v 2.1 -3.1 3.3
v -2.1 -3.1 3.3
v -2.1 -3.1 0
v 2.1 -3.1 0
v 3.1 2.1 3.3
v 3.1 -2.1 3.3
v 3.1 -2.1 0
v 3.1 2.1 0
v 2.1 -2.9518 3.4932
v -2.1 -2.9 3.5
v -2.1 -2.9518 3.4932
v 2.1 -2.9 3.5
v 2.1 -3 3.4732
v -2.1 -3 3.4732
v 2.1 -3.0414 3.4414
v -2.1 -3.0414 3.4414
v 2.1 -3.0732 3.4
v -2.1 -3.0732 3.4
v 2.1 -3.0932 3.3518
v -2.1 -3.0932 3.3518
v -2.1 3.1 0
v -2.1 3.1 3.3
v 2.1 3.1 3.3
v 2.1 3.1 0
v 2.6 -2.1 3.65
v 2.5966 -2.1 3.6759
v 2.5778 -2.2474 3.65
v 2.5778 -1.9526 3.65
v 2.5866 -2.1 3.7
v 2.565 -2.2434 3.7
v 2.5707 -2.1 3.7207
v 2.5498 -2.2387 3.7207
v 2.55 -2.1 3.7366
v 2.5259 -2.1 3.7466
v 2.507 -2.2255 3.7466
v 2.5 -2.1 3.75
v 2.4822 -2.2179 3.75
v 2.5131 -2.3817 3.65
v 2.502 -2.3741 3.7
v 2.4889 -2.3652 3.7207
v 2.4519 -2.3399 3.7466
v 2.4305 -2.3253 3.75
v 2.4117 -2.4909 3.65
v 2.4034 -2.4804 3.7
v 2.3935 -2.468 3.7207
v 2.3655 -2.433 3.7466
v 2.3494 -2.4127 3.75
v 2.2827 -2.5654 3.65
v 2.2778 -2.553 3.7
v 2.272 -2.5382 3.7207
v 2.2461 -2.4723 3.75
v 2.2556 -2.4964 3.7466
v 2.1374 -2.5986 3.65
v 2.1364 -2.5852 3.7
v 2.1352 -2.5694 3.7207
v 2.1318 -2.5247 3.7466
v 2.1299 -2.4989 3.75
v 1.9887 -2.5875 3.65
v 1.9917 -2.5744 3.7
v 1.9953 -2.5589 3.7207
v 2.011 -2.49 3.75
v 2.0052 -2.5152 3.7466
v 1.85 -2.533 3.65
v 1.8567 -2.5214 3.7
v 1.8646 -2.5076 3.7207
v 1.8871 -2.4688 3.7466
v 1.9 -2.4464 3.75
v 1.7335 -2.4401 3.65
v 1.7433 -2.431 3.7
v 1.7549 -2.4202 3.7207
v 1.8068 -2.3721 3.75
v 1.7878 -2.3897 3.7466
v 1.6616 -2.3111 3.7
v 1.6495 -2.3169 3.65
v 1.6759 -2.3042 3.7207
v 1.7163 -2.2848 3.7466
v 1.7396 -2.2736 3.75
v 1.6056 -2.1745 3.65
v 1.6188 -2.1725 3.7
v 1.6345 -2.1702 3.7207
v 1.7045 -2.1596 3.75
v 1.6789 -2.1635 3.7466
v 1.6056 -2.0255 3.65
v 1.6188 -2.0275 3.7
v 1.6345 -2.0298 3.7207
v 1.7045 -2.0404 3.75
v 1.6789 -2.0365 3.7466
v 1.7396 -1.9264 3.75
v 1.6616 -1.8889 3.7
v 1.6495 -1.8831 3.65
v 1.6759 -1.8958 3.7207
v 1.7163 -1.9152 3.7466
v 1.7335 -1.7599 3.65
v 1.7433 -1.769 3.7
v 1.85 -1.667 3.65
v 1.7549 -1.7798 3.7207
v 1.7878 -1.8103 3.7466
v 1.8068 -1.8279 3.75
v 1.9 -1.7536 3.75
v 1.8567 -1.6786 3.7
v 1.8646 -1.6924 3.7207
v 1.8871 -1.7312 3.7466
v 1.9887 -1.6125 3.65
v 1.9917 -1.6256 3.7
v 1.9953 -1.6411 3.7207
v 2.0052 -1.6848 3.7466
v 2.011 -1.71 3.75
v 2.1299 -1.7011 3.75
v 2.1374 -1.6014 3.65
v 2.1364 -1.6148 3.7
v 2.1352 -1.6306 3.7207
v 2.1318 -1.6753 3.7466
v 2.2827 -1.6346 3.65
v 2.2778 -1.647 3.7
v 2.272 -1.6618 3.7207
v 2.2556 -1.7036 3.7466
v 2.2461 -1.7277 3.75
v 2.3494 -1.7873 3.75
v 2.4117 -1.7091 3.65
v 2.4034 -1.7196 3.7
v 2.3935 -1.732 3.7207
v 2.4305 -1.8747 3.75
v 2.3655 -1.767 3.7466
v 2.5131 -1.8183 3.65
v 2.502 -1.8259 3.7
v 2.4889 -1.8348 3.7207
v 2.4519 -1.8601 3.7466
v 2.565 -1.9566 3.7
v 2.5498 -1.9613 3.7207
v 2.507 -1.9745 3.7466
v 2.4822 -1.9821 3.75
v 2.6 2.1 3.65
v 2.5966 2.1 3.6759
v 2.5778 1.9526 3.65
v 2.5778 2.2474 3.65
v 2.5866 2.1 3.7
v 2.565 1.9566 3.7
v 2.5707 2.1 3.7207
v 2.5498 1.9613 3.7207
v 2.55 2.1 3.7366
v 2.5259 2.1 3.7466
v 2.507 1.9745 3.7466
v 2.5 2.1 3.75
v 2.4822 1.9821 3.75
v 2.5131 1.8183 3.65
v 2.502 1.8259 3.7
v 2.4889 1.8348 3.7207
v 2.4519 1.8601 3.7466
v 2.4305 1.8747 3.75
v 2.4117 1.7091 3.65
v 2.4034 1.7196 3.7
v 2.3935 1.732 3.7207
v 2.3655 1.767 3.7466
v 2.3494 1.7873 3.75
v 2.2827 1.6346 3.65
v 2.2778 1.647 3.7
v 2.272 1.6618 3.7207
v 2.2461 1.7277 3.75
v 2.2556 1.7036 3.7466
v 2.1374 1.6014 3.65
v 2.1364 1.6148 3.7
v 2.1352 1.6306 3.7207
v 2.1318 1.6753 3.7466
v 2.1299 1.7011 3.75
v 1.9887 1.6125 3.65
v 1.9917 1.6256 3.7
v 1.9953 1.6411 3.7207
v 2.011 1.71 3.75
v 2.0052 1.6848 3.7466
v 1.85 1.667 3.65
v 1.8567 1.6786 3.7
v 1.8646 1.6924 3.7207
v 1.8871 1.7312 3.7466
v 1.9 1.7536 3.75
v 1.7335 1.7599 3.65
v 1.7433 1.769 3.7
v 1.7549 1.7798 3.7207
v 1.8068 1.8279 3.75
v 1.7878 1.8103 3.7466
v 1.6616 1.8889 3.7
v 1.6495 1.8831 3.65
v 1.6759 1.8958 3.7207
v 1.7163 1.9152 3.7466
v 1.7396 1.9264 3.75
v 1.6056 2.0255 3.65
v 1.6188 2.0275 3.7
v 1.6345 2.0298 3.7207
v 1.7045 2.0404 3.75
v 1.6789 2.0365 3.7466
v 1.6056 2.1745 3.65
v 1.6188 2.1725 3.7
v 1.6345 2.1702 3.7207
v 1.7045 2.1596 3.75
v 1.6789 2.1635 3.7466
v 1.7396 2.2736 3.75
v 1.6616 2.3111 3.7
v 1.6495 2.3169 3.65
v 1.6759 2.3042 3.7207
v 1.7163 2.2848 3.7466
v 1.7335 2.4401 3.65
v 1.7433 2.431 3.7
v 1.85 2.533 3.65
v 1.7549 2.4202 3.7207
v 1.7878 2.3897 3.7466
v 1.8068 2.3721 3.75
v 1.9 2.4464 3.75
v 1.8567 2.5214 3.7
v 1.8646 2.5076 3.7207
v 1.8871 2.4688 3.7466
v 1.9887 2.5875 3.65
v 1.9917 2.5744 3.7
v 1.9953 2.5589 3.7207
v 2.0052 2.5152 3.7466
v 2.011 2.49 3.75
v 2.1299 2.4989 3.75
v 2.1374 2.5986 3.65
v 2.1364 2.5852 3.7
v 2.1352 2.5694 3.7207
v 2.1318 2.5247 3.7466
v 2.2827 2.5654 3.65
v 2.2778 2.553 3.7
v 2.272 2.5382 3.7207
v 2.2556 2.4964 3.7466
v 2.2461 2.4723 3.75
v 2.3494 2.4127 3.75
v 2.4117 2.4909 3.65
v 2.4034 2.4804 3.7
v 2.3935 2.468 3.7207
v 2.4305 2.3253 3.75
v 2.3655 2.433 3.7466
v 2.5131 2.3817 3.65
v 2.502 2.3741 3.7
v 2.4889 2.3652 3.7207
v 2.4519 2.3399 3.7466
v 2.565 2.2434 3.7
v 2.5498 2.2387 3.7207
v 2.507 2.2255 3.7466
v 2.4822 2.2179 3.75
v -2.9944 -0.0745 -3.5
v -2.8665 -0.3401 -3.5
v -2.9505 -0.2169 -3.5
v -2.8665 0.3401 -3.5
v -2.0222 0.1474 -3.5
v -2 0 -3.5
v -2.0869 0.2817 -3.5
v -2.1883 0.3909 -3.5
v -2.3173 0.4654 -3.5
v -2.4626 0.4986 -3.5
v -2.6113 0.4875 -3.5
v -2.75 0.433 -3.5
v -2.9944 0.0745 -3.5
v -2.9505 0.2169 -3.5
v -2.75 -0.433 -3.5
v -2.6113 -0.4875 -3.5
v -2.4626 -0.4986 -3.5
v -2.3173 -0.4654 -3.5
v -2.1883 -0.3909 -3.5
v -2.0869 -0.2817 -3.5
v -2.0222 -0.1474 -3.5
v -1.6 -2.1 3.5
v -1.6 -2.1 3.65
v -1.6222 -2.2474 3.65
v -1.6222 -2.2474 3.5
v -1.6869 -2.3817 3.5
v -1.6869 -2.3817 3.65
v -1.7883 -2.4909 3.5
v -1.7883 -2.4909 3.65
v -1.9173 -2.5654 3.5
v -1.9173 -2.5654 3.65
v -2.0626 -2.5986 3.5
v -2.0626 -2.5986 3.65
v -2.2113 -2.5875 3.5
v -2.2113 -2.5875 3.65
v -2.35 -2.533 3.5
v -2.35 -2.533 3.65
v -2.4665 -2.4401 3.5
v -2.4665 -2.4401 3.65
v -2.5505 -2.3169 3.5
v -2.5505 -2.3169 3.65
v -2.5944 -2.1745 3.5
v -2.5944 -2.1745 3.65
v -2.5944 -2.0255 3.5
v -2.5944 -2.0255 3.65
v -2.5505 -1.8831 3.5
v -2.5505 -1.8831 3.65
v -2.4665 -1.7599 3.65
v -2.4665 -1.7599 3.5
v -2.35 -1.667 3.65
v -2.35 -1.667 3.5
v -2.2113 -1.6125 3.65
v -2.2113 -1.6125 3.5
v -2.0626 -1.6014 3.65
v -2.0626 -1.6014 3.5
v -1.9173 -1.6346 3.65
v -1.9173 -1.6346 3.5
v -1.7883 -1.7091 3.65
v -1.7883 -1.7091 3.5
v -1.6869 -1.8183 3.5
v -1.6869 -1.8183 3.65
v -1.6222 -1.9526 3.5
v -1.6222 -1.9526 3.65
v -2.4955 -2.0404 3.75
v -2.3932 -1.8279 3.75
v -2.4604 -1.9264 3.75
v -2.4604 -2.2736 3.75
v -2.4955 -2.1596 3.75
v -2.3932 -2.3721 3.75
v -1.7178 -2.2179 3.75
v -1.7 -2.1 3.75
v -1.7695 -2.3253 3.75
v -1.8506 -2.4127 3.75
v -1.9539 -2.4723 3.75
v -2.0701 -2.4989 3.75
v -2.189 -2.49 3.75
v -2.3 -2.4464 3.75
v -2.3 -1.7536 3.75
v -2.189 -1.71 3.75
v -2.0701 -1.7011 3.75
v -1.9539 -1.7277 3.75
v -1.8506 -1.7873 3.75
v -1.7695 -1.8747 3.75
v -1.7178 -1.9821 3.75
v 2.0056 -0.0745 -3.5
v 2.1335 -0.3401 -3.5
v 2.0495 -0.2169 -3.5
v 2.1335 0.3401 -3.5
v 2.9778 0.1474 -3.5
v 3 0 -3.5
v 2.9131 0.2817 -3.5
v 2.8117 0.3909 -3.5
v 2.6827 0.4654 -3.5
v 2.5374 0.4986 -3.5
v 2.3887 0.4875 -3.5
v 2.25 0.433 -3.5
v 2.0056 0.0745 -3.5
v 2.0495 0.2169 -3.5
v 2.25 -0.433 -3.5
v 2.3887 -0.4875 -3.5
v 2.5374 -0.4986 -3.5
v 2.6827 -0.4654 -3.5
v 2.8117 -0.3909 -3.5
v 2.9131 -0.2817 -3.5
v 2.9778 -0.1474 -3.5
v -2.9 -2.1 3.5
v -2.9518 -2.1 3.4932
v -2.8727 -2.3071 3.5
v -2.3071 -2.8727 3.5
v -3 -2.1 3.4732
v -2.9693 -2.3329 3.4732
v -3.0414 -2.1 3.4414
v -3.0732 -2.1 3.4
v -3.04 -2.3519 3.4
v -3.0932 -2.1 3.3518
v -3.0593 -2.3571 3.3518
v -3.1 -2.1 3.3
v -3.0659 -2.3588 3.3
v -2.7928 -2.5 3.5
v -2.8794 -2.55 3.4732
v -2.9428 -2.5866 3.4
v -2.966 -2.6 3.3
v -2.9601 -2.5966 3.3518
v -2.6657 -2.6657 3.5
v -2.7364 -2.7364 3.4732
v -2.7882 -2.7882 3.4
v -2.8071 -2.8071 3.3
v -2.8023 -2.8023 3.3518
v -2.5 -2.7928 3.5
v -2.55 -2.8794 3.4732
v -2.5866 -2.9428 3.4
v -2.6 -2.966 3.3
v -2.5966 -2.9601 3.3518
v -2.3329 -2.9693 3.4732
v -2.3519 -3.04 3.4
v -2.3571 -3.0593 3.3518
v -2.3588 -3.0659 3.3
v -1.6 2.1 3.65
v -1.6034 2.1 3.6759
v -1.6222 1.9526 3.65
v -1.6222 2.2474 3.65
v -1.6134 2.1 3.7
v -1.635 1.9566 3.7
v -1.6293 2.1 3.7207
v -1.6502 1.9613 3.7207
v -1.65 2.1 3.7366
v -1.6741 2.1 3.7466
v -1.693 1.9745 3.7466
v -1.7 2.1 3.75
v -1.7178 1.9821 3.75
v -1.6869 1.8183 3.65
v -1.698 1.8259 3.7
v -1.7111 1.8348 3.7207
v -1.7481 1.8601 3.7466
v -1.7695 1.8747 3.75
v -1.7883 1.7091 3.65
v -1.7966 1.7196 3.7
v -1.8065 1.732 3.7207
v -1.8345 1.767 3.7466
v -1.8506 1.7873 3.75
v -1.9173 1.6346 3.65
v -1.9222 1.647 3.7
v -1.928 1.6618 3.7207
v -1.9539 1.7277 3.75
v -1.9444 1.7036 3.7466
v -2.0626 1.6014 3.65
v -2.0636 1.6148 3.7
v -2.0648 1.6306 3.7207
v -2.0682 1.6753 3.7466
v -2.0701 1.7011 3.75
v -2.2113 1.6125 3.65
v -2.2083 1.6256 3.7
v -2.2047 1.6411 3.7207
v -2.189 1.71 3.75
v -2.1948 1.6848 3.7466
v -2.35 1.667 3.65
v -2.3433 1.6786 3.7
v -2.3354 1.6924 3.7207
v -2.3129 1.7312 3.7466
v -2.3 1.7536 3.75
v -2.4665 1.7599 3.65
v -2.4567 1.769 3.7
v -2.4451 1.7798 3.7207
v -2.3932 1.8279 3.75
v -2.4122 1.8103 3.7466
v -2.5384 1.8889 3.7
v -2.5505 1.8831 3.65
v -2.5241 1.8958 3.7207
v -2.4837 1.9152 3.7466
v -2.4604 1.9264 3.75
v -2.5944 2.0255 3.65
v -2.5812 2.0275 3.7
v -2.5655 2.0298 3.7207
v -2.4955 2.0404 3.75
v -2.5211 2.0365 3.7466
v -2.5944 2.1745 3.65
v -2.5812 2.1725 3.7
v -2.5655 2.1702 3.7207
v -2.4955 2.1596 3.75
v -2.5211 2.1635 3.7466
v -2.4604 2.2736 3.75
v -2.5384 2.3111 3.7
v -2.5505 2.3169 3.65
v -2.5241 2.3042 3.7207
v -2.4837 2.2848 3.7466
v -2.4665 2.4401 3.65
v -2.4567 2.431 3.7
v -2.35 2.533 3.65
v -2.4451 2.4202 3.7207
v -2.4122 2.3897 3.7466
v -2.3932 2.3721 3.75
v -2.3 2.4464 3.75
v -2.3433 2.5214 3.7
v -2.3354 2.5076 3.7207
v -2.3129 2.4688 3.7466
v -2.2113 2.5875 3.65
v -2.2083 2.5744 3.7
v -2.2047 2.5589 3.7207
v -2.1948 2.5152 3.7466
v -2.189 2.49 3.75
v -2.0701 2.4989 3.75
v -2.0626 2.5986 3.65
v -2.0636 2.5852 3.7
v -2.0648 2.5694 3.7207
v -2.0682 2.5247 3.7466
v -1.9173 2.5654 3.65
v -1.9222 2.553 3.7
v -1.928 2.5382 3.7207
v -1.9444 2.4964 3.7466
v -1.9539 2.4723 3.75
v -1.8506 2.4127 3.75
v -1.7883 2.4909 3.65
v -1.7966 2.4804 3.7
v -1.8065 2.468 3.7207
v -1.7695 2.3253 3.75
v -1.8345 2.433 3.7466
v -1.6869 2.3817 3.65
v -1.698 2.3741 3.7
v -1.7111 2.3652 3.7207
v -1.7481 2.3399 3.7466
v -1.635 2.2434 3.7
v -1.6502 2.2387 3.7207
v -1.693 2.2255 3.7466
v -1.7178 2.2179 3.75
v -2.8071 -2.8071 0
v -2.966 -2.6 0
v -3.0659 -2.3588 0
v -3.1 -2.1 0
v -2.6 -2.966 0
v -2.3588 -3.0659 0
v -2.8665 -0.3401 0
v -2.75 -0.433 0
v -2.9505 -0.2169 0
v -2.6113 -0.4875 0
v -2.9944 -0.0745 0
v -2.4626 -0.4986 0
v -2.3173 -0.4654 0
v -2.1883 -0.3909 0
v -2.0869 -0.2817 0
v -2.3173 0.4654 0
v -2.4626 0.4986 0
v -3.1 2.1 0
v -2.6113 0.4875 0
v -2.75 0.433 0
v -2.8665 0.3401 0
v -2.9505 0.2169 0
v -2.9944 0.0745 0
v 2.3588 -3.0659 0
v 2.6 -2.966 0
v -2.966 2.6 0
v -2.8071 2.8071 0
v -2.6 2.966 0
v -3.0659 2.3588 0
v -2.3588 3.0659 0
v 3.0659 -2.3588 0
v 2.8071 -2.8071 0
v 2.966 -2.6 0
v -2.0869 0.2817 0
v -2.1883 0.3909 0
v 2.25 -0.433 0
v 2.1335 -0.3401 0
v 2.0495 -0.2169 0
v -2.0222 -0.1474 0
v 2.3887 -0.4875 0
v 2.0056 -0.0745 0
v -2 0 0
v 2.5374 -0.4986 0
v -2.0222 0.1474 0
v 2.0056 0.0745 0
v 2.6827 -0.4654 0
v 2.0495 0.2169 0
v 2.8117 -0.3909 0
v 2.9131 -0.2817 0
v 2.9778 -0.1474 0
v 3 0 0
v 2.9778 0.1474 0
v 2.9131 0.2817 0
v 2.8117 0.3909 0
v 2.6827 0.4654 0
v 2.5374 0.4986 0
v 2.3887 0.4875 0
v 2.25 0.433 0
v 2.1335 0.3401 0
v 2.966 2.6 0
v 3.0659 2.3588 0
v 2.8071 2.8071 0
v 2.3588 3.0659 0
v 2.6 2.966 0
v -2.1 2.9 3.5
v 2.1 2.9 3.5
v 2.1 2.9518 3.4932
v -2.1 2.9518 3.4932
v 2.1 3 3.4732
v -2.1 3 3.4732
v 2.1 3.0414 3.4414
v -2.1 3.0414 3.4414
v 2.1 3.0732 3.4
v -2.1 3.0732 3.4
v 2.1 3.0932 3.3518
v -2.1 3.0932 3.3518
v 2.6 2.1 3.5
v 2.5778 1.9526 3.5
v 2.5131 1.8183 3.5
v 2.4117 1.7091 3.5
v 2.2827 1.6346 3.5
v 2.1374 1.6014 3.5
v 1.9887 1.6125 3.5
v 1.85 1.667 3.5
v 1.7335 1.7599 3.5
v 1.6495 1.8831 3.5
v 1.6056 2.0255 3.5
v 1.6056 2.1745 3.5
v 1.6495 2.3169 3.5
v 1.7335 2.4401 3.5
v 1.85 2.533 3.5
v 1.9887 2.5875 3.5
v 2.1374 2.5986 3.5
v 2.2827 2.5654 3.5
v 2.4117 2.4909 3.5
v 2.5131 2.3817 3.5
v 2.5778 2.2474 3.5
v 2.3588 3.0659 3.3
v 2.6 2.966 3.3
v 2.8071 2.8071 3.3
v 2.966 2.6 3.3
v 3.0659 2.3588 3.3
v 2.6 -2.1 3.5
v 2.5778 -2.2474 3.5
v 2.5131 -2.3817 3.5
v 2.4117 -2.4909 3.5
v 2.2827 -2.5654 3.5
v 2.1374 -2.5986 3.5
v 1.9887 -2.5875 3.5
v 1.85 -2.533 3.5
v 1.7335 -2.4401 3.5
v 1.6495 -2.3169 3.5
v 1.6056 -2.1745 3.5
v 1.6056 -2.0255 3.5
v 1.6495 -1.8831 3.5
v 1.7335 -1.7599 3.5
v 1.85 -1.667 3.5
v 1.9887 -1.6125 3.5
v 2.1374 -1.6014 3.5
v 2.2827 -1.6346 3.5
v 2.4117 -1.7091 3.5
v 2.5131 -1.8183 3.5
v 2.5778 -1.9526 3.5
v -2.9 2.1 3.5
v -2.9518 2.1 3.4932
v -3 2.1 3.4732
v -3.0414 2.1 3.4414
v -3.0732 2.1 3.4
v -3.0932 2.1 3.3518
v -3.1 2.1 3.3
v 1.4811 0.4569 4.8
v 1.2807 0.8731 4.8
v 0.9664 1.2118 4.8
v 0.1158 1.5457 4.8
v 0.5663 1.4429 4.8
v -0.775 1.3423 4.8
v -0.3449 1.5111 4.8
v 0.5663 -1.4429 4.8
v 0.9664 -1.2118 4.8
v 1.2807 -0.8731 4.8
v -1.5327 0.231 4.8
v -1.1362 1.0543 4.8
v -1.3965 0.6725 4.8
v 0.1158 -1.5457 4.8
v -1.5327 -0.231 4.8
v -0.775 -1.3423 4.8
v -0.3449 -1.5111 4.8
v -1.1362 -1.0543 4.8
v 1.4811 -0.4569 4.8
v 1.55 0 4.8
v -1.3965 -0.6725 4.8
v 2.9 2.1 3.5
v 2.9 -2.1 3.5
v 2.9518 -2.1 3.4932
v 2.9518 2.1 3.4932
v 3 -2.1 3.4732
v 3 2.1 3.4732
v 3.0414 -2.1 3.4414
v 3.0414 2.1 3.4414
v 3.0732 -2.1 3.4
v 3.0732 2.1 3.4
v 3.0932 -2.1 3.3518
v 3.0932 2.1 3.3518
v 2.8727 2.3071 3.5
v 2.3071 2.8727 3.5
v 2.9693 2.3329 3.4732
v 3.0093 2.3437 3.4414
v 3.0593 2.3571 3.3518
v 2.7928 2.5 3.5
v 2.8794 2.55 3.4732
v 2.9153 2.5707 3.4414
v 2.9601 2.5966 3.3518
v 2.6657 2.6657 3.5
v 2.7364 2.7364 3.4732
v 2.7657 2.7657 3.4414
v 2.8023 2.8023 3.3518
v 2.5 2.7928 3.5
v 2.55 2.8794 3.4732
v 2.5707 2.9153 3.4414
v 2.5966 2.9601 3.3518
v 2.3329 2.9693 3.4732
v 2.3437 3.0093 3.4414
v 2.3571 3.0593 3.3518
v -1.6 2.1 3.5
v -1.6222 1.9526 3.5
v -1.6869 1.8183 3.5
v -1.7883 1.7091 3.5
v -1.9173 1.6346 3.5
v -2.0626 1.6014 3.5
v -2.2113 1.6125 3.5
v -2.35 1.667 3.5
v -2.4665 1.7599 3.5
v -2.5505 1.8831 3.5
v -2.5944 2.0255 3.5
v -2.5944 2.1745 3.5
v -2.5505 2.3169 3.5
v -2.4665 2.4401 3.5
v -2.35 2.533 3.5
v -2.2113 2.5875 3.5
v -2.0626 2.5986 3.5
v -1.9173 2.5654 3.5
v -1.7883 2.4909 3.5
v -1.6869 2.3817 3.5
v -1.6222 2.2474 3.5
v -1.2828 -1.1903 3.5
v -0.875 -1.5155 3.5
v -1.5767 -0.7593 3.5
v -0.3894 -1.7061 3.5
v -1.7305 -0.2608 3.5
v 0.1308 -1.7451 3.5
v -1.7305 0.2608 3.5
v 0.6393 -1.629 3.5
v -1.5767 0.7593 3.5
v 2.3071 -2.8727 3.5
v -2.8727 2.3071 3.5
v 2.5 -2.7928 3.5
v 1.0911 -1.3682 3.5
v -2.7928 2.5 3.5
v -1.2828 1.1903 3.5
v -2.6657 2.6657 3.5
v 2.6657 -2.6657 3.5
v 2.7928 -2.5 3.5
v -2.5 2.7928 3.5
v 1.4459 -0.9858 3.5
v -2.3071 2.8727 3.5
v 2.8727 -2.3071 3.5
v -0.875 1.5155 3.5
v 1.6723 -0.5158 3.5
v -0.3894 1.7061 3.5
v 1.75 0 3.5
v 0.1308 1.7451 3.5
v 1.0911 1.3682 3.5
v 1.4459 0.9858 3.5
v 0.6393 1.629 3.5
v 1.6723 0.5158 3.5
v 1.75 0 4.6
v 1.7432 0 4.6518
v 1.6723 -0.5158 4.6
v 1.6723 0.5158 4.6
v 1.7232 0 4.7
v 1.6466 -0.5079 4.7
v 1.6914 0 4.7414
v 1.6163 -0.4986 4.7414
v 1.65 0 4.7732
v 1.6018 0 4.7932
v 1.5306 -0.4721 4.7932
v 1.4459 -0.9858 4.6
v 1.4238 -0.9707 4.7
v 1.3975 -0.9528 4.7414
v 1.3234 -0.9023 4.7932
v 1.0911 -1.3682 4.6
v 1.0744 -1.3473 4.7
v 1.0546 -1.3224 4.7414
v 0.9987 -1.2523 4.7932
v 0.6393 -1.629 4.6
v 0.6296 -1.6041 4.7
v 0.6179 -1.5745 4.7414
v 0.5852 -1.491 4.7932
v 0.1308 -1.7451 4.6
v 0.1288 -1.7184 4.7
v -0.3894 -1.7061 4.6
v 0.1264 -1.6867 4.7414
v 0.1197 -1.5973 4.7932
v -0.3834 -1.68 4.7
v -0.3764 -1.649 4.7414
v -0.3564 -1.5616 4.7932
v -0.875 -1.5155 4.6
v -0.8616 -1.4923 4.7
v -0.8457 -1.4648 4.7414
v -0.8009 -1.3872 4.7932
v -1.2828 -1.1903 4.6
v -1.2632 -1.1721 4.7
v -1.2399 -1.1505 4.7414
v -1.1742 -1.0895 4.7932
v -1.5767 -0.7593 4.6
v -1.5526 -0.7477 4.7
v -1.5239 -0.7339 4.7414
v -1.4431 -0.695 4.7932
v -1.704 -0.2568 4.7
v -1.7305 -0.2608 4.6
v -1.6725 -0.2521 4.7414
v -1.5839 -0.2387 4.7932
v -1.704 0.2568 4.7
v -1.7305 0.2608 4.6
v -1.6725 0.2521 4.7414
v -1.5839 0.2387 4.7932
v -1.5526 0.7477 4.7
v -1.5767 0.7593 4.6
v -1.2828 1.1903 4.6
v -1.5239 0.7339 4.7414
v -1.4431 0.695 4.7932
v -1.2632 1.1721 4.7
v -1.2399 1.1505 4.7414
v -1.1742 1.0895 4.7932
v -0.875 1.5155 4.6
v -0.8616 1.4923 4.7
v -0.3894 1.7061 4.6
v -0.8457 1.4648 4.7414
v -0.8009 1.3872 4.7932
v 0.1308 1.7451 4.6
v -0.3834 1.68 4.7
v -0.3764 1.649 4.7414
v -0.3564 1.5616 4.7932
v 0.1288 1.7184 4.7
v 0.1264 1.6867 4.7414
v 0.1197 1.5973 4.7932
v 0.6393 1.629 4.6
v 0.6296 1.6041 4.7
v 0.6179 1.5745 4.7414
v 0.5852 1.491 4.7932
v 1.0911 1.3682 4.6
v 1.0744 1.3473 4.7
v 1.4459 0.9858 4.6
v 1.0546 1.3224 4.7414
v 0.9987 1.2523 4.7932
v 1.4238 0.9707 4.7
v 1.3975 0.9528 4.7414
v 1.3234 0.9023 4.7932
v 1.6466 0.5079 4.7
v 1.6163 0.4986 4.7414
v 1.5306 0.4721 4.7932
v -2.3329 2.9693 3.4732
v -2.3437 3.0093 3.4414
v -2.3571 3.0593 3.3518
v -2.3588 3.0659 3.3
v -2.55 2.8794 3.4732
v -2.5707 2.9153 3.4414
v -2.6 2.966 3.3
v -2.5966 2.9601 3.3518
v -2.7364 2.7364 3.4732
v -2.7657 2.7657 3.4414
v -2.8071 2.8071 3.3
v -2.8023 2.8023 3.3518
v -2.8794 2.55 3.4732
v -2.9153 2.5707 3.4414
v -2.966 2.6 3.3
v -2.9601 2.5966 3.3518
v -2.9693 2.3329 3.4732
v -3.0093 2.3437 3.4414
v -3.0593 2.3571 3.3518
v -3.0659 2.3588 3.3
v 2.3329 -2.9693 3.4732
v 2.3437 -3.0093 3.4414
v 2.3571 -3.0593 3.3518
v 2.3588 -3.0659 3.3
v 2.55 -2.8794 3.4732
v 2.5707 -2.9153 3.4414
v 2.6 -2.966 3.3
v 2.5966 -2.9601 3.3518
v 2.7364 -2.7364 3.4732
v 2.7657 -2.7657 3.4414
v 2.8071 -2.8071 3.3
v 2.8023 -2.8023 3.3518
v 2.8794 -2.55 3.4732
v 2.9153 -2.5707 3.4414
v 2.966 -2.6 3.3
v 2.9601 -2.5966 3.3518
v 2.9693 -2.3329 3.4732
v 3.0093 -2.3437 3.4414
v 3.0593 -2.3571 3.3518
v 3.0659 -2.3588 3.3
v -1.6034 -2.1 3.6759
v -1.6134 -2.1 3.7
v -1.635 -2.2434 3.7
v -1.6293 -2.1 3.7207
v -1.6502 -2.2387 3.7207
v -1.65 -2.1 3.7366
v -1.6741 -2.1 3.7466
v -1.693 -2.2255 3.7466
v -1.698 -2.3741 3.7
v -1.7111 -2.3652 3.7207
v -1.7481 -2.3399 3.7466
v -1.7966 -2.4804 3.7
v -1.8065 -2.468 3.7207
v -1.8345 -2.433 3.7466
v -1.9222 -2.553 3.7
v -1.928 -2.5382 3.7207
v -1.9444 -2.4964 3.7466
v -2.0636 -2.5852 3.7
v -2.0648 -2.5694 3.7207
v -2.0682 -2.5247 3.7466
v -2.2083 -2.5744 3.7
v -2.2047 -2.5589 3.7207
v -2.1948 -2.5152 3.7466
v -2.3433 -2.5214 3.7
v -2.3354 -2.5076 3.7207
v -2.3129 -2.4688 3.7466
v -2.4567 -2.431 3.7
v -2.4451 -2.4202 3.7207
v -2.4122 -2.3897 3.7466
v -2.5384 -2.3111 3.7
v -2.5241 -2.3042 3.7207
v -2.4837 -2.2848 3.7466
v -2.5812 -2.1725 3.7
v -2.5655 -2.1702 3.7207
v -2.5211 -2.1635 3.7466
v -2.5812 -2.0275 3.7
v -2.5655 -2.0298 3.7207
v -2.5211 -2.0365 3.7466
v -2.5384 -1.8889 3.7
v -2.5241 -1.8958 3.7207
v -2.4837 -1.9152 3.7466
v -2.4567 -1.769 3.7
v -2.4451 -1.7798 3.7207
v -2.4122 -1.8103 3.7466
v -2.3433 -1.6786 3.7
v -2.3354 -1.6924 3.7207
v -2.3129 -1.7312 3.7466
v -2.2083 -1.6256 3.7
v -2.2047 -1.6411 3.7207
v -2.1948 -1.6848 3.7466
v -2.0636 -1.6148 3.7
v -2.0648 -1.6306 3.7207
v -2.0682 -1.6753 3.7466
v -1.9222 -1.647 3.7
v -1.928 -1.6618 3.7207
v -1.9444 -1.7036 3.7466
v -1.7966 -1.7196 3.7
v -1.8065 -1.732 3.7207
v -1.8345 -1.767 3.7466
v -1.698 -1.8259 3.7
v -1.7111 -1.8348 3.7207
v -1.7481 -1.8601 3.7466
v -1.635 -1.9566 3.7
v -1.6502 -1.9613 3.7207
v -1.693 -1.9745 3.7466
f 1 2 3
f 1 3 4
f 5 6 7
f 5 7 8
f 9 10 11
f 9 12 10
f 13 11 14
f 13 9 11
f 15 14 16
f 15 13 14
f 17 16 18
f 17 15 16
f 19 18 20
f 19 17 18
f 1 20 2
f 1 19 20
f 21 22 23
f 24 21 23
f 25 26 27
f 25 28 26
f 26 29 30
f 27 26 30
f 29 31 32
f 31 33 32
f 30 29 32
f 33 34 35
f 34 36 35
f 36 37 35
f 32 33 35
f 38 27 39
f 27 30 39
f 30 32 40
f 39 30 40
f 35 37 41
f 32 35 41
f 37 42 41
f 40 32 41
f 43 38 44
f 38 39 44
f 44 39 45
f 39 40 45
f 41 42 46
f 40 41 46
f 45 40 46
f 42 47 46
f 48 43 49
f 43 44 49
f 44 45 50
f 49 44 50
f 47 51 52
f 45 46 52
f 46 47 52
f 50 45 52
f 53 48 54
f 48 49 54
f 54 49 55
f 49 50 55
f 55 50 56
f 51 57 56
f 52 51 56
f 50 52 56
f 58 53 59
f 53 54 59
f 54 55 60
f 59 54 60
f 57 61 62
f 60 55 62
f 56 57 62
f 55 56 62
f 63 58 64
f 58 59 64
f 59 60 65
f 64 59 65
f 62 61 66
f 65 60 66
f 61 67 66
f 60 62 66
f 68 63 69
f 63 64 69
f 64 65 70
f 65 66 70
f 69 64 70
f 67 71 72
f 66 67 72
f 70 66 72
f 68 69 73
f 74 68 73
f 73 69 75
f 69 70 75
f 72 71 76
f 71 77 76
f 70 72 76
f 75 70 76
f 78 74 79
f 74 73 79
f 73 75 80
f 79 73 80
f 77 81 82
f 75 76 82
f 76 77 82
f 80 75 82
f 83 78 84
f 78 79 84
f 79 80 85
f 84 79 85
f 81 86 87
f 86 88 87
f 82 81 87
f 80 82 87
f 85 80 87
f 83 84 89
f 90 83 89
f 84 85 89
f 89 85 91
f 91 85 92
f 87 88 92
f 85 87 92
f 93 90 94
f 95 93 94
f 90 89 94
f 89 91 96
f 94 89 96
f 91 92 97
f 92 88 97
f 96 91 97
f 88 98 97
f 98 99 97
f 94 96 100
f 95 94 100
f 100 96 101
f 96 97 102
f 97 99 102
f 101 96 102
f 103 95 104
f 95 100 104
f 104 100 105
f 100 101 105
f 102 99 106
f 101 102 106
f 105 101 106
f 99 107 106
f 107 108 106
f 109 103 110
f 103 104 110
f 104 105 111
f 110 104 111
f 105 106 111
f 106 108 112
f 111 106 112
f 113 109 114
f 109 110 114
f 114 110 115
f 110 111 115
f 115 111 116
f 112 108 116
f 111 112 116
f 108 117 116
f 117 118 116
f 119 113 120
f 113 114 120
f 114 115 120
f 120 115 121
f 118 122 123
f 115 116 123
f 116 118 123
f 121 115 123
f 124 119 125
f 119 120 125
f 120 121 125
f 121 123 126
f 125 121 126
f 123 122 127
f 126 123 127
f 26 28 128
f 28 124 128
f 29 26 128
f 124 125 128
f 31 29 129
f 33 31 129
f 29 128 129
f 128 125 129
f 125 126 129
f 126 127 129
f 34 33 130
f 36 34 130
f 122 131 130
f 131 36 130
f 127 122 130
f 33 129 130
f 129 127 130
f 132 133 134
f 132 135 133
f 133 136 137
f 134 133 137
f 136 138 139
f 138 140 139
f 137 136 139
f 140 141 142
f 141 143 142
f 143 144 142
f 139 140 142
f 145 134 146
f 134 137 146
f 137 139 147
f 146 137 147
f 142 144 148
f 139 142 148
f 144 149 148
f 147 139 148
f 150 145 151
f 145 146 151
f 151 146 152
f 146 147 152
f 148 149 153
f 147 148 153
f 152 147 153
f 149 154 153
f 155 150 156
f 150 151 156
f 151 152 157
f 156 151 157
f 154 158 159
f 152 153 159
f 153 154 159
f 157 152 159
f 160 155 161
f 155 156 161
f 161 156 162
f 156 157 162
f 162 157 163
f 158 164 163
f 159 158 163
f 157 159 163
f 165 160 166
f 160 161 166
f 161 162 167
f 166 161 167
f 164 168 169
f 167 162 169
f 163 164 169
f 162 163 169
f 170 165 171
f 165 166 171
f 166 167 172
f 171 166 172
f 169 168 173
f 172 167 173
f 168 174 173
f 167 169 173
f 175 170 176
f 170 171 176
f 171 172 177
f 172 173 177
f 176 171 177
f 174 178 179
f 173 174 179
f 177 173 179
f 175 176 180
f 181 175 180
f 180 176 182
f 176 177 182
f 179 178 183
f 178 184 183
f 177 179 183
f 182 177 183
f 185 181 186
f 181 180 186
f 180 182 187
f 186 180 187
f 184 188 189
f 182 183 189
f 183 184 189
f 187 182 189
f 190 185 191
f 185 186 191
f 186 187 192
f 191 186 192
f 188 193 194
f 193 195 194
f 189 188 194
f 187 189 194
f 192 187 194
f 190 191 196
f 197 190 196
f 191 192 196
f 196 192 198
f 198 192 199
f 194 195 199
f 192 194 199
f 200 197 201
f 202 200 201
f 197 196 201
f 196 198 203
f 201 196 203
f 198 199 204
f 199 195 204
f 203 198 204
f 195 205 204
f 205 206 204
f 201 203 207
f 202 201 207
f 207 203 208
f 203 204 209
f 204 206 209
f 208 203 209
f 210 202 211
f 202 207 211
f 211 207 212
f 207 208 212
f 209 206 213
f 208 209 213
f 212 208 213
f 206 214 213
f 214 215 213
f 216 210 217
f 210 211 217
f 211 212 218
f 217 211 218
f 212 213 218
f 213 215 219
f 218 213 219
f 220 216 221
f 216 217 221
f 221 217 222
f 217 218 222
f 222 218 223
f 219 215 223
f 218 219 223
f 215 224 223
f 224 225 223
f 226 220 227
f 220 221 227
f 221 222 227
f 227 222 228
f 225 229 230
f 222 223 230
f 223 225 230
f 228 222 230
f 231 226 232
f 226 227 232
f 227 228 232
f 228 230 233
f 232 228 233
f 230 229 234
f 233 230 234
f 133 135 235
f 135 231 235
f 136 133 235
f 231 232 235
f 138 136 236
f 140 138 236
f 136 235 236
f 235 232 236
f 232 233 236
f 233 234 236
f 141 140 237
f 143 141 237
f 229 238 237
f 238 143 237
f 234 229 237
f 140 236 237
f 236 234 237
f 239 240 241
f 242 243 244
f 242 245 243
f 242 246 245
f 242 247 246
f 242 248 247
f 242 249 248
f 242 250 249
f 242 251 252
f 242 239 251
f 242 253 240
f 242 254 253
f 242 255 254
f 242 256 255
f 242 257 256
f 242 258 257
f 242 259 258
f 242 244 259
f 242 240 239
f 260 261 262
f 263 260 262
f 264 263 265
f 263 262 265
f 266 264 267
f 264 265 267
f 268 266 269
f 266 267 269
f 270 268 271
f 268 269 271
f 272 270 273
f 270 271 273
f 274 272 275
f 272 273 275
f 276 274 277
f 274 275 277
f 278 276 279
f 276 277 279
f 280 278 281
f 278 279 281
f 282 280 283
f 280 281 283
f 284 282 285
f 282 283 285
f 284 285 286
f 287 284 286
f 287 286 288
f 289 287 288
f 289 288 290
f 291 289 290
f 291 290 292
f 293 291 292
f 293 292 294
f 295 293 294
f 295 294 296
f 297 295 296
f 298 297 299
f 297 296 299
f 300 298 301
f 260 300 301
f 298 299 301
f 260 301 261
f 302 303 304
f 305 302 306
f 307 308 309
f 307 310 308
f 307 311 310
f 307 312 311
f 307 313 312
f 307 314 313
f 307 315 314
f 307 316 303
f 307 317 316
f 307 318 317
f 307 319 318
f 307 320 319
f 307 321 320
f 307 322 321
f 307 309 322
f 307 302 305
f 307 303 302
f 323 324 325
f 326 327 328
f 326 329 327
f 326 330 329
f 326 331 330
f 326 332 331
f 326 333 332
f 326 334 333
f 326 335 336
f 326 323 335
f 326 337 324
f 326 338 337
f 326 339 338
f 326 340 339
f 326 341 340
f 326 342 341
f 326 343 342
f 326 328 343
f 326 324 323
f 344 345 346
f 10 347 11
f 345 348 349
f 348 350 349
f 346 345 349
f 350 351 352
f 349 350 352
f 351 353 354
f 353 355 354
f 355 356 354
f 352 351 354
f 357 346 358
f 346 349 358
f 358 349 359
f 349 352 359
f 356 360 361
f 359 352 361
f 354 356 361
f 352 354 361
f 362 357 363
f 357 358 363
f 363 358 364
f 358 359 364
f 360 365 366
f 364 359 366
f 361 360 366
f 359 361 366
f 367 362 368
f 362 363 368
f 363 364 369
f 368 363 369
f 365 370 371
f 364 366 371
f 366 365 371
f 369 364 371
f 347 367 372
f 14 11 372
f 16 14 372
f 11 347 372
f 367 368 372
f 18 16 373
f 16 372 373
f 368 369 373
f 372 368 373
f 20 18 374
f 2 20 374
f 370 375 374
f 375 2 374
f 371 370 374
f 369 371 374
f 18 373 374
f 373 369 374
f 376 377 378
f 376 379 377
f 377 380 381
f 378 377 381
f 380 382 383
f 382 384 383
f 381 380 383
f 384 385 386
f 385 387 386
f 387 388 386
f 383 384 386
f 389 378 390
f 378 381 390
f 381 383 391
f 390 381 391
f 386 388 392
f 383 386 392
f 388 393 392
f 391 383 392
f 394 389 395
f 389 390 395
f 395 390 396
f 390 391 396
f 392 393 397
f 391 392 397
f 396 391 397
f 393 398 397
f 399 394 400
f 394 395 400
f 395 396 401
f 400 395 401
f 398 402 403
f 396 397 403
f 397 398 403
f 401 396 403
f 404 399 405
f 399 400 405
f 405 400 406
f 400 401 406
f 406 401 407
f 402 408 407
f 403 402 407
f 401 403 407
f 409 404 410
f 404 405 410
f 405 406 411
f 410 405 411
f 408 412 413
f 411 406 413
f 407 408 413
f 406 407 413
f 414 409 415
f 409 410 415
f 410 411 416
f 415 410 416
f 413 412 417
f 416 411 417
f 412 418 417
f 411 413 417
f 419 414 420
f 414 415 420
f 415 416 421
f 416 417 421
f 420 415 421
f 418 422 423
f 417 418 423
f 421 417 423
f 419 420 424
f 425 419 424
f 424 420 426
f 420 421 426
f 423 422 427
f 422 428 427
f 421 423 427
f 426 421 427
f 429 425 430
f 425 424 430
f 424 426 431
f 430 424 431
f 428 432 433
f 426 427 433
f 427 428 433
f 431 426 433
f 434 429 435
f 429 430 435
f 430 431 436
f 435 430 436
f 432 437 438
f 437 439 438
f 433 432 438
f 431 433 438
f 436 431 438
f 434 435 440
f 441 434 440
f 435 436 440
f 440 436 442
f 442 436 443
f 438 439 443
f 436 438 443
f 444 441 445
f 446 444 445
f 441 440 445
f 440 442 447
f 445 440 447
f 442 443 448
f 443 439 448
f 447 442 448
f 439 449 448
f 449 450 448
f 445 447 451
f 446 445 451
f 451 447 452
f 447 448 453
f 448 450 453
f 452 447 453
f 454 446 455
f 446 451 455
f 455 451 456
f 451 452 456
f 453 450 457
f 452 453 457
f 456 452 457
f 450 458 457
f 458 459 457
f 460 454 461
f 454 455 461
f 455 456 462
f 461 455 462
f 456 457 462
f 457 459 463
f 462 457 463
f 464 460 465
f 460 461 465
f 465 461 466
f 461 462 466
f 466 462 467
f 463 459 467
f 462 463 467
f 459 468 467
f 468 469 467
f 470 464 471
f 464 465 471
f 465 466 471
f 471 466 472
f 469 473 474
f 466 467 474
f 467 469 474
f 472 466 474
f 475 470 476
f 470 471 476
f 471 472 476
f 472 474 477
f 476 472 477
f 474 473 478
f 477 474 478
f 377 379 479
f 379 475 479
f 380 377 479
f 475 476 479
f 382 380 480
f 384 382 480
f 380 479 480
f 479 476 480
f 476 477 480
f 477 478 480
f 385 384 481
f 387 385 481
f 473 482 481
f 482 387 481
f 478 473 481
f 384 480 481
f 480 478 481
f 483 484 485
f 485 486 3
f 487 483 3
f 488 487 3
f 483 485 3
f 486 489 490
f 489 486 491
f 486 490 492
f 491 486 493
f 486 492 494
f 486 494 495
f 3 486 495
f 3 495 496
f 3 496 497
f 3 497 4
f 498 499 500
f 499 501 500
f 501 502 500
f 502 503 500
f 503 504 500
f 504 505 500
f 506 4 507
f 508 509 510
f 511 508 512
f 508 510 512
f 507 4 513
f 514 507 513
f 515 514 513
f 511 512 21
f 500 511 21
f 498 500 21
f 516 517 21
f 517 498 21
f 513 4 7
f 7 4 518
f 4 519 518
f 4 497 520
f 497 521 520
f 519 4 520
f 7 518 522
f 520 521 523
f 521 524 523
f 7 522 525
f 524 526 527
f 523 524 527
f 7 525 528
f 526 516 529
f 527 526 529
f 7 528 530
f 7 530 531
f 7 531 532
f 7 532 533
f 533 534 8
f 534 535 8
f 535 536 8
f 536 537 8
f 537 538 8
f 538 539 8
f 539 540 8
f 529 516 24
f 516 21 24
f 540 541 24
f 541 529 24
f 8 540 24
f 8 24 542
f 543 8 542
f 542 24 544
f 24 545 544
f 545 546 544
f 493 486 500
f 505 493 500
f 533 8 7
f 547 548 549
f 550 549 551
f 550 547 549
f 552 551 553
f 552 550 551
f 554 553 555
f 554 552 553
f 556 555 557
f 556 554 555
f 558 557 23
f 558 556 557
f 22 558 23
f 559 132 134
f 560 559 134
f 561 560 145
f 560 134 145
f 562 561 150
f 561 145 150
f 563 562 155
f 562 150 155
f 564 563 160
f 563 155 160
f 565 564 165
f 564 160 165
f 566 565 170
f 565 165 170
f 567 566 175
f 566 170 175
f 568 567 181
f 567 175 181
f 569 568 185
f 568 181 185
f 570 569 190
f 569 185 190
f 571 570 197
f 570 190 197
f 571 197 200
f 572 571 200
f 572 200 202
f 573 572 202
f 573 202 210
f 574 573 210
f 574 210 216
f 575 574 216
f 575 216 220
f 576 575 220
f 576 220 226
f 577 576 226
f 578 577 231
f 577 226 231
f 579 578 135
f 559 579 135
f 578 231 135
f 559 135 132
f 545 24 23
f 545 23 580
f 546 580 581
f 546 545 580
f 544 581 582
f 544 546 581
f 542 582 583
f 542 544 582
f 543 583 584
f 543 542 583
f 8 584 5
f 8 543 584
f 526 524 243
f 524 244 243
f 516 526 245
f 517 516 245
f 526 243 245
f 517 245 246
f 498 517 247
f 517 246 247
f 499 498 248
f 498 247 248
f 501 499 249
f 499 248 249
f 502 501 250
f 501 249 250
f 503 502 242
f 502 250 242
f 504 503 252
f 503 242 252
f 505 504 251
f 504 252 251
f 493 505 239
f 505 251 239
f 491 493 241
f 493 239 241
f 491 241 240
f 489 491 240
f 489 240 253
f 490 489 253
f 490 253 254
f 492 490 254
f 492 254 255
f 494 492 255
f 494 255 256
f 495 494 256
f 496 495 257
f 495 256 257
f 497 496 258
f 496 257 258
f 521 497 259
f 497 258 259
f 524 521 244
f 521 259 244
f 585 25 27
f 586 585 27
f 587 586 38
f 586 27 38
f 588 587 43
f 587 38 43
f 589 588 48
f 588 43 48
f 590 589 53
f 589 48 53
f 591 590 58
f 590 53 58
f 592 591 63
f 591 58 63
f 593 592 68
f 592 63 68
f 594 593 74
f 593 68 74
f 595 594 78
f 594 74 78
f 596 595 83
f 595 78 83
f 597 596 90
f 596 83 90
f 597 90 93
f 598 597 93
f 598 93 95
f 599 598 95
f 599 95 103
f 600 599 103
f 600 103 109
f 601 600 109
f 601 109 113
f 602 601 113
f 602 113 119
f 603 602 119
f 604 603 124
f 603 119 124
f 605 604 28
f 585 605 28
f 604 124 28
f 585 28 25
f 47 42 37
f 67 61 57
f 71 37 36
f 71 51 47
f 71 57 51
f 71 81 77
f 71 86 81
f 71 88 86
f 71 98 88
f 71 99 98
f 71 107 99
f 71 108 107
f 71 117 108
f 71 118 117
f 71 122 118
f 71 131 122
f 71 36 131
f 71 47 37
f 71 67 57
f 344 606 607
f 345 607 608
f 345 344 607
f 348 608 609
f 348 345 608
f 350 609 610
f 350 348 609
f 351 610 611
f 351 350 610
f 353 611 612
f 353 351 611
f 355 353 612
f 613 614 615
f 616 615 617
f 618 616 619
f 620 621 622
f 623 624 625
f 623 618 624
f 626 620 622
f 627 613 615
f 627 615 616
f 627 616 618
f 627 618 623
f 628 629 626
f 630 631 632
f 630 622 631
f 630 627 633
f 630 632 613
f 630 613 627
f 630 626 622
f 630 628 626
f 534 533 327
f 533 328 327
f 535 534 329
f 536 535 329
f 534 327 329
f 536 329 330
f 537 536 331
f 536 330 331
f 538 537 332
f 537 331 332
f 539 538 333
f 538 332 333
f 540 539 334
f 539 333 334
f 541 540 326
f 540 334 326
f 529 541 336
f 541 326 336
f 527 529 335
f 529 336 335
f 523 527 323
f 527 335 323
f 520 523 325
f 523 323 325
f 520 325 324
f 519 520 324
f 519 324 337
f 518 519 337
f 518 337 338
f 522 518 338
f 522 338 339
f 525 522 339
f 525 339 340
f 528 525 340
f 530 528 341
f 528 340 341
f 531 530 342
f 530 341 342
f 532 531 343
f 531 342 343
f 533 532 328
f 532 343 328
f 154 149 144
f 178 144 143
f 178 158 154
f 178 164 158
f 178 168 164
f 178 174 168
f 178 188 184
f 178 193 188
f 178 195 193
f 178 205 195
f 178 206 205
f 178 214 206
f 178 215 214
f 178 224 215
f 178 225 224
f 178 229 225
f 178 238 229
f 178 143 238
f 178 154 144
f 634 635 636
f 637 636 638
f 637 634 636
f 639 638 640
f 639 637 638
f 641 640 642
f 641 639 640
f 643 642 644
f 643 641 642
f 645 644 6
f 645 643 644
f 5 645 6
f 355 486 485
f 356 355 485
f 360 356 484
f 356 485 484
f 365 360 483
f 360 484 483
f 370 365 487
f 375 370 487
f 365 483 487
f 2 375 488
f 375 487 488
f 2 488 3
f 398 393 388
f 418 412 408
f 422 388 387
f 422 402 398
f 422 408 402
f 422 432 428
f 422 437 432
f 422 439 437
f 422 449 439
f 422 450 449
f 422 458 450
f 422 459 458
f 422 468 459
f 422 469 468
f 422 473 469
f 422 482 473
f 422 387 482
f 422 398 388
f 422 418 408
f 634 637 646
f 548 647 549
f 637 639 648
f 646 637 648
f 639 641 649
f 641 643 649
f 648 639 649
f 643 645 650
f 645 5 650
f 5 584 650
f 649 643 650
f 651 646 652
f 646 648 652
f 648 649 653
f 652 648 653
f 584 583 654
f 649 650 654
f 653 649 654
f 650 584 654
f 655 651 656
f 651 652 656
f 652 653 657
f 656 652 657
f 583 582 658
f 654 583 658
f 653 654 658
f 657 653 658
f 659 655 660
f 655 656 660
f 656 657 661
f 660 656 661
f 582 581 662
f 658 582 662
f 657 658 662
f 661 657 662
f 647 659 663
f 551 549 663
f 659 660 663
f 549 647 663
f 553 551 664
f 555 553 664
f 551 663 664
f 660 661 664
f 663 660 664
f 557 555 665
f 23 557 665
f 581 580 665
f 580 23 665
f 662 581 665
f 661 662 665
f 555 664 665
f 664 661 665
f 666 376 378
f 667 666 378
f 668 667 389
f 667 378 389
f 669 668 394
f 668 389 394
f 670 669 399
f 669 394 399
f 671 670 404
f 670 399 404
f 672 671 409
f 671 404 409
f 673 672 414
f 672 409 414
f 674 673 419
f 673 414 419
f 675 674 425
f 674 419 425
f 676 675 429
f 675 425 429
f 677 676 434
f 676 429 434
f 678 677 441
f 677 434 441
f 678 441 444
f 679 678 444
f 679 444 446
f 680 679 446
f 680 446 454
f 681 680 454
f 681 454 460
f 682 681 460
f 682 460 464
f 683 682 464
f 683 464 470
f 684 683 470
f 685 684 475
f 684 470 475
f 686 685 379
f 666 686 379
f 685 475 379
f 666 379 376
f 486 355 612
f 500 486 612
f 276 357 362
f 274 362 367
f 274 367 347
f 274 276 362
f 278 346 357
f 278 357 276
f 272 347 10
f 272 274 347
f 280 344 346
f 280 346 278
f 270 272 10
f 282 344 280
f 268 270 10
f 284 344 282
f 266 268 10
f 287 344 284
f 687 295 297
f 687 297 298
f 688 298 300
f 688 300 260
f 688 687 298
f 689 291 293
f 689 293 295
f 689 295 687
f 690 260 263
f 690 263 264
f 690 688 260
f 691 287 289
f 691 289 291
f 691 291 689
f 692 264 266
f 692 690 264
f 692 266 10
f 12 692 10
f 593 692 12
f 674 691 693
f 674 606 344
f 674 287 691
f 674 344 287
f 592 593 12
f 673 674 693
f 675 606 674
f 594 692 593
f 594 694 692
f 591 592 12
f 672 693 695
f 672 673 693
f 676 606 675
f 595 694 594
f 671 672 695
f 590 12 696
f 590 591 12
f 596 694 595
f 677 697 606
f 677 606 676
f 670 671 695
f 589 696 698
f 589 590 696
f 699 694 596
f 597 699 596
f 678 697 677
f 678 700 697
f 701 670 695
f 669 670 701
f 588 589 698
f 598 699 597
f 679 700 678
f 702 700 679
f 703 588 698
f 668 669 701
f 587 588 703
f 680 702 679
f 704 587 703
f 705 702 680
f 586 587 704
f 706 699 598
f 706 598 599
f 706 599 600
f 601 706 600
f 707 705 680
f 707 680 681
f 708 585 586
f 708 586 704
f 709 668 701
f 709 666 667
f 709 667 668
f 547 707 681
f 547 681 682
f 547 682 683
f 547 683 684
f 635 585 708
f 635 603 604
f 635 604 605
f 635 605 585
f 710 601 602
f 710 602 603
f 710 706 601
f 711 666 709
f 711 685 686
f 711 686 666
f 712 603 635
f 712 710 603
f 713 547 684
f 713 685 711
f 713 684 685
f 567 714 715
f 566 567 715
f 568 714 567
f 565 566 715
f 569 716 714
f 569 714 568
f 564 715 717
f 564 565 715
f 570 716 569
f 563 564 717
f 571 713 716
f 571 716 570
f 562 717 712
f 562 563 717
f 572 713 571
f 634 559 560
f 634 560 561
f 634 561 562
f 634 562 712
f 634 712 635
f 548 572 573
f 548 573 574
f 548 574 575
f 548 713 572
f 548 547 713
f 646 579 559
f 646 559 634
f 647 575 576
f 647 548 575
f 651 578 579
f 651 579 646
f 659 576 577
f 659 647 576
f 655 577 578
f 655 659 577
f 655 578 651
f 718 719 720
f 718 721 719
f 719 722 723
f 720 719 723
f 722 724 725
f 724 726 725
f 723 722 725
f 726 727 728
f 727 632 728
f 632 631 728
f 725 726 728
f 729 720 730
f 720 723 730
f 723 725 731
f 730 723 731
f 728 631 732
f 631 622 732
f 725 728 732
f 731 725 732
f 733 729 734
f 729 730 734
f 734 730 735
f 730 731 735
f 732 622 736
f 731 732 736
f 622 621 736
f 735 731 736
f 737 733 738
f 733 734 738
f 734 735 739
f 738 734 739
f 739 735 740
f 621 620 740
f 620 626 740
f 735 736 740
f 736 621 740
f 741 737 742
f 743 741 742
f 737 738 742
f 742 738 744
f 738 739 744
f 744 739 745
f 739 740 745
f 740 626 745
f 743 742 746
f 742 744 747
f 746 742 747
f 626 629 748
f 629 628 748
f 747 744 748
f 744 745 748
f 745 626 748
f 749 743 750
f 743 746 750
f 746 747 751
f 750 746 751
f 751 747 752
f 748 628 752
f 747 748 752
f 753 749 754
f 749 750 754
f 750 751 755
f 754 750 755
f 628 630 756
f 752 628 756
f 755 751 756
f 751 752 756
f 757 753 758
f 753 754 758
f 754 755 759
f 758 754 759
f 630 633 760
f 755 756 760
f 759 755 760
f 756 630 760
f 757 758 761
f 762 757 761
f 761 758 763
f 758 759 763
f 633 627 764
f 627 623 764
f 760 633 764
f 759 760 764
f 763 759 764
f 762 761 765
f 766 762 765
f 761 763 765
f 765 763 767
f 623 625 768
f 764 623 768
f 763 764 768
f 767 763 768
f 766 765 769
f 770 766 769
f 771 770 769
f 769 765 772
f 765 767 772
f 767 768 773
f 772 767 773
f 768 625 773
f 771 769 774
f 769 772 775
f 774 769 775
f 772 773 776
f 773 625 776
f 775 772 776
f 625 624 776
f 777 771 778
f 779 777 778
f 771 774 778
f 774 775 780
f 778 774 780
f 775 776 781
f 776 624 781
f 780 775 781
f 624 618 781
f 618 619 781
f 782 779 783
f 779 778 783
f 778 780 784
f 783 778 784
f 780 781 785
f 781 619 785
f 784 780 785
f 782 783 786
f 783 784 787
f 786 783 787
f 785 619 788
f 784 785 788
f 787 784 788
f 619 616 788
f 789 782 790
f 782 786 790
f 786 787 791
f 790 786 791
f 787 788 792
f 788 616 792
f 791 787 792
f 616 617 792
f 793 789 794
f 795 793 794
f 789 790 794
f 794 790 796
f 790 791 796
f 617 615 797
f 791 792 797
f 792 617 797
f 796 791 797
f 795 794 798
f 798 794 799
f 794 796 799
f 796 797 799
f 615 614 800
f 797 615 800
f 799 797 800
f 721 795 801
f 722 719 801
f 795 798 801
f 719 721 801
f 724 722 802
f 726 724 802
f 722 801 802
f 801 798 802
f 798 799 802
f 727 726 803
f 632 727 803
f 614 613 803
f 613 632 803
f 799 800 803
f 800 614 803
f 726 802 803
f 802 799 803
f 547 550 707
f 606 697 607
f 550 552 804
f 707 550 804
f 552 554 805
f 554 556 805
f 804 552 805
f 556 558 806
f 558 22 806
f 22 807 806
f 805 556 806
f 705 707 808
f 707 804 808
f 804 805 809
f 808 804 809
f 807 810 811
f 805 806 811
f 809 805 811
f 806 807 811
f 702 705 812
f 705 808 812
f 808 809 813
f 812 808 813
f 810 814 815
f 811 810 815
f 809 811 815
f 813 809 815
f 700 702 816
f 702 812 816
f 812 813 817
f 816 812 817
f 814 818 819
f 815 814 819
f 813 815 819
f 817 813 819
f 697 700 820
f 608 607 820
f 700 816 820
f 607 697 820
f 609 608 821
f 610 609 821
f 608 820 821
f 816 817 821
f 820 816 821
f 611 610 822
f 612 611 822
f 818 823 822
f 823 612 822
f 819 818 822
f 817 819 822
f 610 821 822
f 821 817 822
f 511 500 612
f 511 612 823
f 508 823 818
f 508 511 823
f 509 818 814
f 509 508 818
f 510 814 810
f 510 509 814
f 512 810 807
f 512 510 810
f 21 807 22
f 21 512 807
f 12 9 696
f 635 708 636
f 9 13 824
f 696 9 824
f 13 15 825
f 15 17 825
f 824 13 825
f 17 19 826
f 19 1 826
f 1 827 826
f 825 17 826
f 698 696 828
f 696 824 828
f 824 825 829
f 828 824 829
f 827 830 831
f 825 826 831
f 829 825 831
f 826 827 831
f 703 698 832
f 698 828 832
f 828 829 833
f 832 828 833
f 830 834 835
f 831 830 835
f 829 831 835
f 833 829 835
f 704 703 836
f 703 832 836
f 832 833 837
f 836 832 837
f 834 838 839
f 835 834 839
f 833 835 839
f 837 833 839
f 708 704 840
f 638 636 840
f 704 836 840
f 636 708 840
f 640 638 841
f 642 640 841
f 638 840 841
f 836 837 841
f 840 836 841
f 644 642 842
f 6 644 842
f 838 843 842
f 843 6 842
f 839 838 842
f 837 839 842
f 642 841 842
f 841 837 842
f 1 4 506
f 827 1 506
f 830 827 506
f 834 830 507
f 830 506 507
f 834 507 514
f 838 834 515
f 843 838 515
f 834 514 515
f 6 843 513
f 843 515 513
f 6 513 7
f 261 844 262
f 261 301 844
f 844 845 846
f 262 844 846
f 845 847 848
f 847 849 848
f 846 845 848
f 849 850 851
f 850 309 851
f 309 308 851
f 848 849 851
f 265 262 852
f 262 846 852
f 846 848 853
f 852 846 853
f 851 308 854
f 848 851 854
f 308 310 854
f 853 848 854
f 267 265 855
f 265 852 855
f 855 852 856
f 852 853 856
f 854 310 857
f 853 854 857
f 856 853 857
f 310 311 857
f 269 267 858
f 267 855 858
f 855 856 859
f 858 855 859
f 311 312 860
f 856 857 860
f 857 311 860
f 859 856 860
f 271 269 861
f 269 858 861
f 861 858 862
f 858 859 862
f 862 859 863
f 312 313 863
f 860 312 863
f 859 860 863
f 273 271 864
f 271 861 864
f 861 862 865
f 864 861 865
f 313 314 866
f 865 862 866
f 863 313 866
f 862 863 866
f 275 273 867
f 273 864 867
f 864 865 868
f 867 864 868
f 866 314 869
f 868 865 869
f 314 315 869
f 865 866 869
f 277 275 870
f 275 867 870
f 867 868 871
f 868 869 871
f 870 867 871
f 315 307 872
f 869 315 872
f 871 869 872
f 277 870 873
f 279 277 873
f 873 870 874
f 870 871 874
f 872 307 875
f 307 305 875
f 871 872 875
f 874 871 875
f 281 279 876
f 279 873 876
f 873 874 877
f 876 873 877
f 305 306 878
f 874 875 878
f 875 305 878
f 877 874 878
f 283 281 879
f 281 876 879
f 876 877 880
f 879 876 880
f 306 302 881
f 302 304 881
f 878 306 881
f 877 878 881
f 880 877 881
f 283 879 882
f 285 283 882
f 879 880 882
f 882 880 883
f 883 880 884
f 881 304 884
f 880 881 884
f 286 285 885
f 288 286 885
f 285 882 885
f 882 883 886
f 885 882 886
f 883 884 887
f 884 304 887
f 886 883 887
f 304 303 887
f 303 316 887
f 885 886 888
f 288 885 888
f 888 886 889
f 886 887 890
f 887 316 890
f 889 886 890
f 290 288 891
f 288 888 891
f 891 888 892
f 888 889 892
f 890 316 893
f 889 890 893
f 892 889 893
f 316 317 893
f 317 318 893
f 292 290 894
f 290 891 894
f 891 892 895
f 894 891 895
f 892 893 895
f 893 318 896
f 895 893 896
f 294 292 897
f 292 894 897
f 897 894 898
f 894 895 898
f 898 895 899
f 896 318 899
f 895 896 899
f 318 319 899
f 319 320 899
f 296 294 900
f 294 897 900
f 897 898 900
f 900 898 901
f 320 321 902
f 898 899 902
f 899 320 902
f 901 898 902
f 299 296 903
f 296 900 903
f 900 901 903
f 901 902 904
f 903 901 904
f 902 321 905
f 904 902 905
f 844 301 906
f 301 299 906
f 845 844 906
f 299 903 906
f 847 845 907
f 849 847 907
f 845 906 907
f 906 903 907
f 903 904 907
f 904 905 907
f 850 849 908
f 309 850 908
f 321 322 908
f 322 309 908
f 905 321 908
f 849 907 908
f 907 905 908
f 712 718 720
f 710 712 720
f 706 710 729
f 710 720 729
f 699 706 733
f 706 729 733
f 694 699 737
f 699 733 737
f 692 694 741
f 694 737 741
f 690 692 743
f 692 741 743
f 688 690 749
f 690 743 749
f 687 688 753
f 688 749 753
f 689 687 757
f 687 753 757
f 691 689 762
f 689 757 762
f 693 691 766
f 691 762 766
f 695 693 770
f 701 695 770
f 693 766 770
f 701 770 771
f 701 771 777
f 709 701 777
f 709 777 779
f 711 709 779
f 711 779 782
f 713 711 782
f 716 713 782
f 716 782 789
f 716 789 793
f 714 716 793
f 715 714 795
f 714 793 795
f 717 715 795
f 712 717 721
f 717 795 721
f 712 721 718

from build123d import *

# Parameters (mm, degrees)
SKETCH1_W           = 6.2
SKETCH1_H           = 6.2
BOSS_EXTRUDE1_DEPTH = 3.5
SKETCH2_W           = 0.5
SKETCH2_H           = 3.5
SKETCH3_W           = 0.5
SKETCH3_H           = 3.5
SKETCH4_W           = 0.5
SKETCH4_H           = 0.25
SKETCH5_W           = 0.5
SKETCH5_H           = 0.25
SKETCH6_W           = 0.5
SKETCH6_H           = 0.25
SKETCH7_W           = 1.75
SKETCH7_H           = 1.3
SKETCH8_W           = 0.5
SKETCH8_H           = 0.25
FILLET1_R           = 1
FILLET2_R           = 0.1
FILLET3_R           = 0.2


with BuildPart() as part:
    # Sketch1 → Boss-Extrude1 (new body)
    with BuildSketch(Plane.XY.offset(3.5)):
        Rectangle(SKETCH1_W, SKETCH1_H)
    extrude(amount=-BOSS_EXTRUDE1_DEPTH)

    # Sketch2 → Revolve1 (revolve)
    with BuildSketch(Plane(origin=(0, 0, 0), x_dir=(1, 0, 0), z_dir=(0, 1, 0))):
        with Locations((2.75, 1.75)):
            Rectangle(SKETCH2_W, SKETCH2_H)
    revolve(axis=Axis((2.5, 0, -3.5), (0, 0, 1)))

    # Sketch3 → Revolve2 (revolve)
    with BuildSketch(Plane(origin=(0, 0, 0), x_dir=(1, 0, 0), z_dir=(0, 1, 0))):
        with Locations((-2.25, 1.75)):
            Rectangle(SKETCH3_W, SKETCH3_H)
    revolve(axis=Axis((-2.5, 0, -3.5), (0, 0, 1)))

    # Sketch4 → Revolve3 (revolve)
    with BuildSketch(Plane.XZ.offset(2.1)):
        with Locations((2.35, 3.625)):
            Rectangle(SKETCH4_W, SKETCH4_H)
    revolve(axis=Axis((2.1, -2.1, 3.75), (0, 0, -1)))

    # Sketch5 → Revolve4 (revolve)
    with BuildSketch(Plane.XZ.offset(-2.1)):
        with Locations((2.35, 3.625)):
            Rectangle(SKETCH5_W, SKETCH5_H)
    revolve(axis=Axis((2.1, 2.1, 3.75), (0, 0, -1)))

    # Sketch6 → Revolve5 (revolve)
    with BuildSketch(Plane.XZ.offset(-2.1)):
        with Locations((-1.85, 3.625)):
            Rectangle(SKETCH6_W, SKETCH6_H)
    revolve(axis=Axis((-2.1, 2.1, 3.75), (0, 0, -1)))

    # Sketch7 → Revolve6 (revolve)
    with BuildSketch(Plane.XZ):
        with Locations((0.875, 4.15)):
            Rectangle(SKETCH7_W, SKETCH7_H)
    revolve(axis=Axis((0, 0, 4.8), (0, 0, -1)))

    # Sketch8 → Revolve7 (revolve)
    with BuildSketch(Plane.XZ.offset(2.1)):
        with Locations((-1.85, 3.625)):
            Rectangle(SKETCH8_W, SKETCH8_H)
    revolve(axis=Axis((-2.1, -2.1, 3.75), (0, 0, -1)))

    # Fillet1
    fillet1_edges = [part.edges().sort_by_distance(p)[0] for p in [
        (3.1, -3.1, 1.75),
        (-3.1, -3.1, 1.75),
        (-3.1, 3.1, 1.75),
        (3.1, 3.1, 1.75),
    ]]
    fillet(fillet1_edges, radius=FILLET1_R)

    # Fillet2
    fillet2_edges = [part.edges().sort_by_distance(p)[0] for p in [
        (1.6, -2.1, 3.75),
        (1.6, 2.1, 3.75),
        (-2.6, 2.1, 3.75),
        (-2.6, -2.1, 3.75),
    ]]
    fillet(fillet2_edges, radius=FILLET2_R)

    # Fillet3
    fillet3_edges = [part.edges().sort_by_distance(p)[0] for p in [
        (-1.75, 0, 4.8),
        (0, -3.1, 3.5),
        (3.1, 0, 3.5),
        (0, 3.1, 3.5),
        (-3.1, 0, 3.5),
        (-2.807106781, -2.807106781, 3.5),
        (-2.807106781, 2.807106781, 3.5),
        (2.807106781, 2.807106781, 3.5),
        (2.807106781, -2.807106781, 3.5),
    ]]
    fillet(fillet3_edges, radius=FILLET3_R)


solid = part.part
